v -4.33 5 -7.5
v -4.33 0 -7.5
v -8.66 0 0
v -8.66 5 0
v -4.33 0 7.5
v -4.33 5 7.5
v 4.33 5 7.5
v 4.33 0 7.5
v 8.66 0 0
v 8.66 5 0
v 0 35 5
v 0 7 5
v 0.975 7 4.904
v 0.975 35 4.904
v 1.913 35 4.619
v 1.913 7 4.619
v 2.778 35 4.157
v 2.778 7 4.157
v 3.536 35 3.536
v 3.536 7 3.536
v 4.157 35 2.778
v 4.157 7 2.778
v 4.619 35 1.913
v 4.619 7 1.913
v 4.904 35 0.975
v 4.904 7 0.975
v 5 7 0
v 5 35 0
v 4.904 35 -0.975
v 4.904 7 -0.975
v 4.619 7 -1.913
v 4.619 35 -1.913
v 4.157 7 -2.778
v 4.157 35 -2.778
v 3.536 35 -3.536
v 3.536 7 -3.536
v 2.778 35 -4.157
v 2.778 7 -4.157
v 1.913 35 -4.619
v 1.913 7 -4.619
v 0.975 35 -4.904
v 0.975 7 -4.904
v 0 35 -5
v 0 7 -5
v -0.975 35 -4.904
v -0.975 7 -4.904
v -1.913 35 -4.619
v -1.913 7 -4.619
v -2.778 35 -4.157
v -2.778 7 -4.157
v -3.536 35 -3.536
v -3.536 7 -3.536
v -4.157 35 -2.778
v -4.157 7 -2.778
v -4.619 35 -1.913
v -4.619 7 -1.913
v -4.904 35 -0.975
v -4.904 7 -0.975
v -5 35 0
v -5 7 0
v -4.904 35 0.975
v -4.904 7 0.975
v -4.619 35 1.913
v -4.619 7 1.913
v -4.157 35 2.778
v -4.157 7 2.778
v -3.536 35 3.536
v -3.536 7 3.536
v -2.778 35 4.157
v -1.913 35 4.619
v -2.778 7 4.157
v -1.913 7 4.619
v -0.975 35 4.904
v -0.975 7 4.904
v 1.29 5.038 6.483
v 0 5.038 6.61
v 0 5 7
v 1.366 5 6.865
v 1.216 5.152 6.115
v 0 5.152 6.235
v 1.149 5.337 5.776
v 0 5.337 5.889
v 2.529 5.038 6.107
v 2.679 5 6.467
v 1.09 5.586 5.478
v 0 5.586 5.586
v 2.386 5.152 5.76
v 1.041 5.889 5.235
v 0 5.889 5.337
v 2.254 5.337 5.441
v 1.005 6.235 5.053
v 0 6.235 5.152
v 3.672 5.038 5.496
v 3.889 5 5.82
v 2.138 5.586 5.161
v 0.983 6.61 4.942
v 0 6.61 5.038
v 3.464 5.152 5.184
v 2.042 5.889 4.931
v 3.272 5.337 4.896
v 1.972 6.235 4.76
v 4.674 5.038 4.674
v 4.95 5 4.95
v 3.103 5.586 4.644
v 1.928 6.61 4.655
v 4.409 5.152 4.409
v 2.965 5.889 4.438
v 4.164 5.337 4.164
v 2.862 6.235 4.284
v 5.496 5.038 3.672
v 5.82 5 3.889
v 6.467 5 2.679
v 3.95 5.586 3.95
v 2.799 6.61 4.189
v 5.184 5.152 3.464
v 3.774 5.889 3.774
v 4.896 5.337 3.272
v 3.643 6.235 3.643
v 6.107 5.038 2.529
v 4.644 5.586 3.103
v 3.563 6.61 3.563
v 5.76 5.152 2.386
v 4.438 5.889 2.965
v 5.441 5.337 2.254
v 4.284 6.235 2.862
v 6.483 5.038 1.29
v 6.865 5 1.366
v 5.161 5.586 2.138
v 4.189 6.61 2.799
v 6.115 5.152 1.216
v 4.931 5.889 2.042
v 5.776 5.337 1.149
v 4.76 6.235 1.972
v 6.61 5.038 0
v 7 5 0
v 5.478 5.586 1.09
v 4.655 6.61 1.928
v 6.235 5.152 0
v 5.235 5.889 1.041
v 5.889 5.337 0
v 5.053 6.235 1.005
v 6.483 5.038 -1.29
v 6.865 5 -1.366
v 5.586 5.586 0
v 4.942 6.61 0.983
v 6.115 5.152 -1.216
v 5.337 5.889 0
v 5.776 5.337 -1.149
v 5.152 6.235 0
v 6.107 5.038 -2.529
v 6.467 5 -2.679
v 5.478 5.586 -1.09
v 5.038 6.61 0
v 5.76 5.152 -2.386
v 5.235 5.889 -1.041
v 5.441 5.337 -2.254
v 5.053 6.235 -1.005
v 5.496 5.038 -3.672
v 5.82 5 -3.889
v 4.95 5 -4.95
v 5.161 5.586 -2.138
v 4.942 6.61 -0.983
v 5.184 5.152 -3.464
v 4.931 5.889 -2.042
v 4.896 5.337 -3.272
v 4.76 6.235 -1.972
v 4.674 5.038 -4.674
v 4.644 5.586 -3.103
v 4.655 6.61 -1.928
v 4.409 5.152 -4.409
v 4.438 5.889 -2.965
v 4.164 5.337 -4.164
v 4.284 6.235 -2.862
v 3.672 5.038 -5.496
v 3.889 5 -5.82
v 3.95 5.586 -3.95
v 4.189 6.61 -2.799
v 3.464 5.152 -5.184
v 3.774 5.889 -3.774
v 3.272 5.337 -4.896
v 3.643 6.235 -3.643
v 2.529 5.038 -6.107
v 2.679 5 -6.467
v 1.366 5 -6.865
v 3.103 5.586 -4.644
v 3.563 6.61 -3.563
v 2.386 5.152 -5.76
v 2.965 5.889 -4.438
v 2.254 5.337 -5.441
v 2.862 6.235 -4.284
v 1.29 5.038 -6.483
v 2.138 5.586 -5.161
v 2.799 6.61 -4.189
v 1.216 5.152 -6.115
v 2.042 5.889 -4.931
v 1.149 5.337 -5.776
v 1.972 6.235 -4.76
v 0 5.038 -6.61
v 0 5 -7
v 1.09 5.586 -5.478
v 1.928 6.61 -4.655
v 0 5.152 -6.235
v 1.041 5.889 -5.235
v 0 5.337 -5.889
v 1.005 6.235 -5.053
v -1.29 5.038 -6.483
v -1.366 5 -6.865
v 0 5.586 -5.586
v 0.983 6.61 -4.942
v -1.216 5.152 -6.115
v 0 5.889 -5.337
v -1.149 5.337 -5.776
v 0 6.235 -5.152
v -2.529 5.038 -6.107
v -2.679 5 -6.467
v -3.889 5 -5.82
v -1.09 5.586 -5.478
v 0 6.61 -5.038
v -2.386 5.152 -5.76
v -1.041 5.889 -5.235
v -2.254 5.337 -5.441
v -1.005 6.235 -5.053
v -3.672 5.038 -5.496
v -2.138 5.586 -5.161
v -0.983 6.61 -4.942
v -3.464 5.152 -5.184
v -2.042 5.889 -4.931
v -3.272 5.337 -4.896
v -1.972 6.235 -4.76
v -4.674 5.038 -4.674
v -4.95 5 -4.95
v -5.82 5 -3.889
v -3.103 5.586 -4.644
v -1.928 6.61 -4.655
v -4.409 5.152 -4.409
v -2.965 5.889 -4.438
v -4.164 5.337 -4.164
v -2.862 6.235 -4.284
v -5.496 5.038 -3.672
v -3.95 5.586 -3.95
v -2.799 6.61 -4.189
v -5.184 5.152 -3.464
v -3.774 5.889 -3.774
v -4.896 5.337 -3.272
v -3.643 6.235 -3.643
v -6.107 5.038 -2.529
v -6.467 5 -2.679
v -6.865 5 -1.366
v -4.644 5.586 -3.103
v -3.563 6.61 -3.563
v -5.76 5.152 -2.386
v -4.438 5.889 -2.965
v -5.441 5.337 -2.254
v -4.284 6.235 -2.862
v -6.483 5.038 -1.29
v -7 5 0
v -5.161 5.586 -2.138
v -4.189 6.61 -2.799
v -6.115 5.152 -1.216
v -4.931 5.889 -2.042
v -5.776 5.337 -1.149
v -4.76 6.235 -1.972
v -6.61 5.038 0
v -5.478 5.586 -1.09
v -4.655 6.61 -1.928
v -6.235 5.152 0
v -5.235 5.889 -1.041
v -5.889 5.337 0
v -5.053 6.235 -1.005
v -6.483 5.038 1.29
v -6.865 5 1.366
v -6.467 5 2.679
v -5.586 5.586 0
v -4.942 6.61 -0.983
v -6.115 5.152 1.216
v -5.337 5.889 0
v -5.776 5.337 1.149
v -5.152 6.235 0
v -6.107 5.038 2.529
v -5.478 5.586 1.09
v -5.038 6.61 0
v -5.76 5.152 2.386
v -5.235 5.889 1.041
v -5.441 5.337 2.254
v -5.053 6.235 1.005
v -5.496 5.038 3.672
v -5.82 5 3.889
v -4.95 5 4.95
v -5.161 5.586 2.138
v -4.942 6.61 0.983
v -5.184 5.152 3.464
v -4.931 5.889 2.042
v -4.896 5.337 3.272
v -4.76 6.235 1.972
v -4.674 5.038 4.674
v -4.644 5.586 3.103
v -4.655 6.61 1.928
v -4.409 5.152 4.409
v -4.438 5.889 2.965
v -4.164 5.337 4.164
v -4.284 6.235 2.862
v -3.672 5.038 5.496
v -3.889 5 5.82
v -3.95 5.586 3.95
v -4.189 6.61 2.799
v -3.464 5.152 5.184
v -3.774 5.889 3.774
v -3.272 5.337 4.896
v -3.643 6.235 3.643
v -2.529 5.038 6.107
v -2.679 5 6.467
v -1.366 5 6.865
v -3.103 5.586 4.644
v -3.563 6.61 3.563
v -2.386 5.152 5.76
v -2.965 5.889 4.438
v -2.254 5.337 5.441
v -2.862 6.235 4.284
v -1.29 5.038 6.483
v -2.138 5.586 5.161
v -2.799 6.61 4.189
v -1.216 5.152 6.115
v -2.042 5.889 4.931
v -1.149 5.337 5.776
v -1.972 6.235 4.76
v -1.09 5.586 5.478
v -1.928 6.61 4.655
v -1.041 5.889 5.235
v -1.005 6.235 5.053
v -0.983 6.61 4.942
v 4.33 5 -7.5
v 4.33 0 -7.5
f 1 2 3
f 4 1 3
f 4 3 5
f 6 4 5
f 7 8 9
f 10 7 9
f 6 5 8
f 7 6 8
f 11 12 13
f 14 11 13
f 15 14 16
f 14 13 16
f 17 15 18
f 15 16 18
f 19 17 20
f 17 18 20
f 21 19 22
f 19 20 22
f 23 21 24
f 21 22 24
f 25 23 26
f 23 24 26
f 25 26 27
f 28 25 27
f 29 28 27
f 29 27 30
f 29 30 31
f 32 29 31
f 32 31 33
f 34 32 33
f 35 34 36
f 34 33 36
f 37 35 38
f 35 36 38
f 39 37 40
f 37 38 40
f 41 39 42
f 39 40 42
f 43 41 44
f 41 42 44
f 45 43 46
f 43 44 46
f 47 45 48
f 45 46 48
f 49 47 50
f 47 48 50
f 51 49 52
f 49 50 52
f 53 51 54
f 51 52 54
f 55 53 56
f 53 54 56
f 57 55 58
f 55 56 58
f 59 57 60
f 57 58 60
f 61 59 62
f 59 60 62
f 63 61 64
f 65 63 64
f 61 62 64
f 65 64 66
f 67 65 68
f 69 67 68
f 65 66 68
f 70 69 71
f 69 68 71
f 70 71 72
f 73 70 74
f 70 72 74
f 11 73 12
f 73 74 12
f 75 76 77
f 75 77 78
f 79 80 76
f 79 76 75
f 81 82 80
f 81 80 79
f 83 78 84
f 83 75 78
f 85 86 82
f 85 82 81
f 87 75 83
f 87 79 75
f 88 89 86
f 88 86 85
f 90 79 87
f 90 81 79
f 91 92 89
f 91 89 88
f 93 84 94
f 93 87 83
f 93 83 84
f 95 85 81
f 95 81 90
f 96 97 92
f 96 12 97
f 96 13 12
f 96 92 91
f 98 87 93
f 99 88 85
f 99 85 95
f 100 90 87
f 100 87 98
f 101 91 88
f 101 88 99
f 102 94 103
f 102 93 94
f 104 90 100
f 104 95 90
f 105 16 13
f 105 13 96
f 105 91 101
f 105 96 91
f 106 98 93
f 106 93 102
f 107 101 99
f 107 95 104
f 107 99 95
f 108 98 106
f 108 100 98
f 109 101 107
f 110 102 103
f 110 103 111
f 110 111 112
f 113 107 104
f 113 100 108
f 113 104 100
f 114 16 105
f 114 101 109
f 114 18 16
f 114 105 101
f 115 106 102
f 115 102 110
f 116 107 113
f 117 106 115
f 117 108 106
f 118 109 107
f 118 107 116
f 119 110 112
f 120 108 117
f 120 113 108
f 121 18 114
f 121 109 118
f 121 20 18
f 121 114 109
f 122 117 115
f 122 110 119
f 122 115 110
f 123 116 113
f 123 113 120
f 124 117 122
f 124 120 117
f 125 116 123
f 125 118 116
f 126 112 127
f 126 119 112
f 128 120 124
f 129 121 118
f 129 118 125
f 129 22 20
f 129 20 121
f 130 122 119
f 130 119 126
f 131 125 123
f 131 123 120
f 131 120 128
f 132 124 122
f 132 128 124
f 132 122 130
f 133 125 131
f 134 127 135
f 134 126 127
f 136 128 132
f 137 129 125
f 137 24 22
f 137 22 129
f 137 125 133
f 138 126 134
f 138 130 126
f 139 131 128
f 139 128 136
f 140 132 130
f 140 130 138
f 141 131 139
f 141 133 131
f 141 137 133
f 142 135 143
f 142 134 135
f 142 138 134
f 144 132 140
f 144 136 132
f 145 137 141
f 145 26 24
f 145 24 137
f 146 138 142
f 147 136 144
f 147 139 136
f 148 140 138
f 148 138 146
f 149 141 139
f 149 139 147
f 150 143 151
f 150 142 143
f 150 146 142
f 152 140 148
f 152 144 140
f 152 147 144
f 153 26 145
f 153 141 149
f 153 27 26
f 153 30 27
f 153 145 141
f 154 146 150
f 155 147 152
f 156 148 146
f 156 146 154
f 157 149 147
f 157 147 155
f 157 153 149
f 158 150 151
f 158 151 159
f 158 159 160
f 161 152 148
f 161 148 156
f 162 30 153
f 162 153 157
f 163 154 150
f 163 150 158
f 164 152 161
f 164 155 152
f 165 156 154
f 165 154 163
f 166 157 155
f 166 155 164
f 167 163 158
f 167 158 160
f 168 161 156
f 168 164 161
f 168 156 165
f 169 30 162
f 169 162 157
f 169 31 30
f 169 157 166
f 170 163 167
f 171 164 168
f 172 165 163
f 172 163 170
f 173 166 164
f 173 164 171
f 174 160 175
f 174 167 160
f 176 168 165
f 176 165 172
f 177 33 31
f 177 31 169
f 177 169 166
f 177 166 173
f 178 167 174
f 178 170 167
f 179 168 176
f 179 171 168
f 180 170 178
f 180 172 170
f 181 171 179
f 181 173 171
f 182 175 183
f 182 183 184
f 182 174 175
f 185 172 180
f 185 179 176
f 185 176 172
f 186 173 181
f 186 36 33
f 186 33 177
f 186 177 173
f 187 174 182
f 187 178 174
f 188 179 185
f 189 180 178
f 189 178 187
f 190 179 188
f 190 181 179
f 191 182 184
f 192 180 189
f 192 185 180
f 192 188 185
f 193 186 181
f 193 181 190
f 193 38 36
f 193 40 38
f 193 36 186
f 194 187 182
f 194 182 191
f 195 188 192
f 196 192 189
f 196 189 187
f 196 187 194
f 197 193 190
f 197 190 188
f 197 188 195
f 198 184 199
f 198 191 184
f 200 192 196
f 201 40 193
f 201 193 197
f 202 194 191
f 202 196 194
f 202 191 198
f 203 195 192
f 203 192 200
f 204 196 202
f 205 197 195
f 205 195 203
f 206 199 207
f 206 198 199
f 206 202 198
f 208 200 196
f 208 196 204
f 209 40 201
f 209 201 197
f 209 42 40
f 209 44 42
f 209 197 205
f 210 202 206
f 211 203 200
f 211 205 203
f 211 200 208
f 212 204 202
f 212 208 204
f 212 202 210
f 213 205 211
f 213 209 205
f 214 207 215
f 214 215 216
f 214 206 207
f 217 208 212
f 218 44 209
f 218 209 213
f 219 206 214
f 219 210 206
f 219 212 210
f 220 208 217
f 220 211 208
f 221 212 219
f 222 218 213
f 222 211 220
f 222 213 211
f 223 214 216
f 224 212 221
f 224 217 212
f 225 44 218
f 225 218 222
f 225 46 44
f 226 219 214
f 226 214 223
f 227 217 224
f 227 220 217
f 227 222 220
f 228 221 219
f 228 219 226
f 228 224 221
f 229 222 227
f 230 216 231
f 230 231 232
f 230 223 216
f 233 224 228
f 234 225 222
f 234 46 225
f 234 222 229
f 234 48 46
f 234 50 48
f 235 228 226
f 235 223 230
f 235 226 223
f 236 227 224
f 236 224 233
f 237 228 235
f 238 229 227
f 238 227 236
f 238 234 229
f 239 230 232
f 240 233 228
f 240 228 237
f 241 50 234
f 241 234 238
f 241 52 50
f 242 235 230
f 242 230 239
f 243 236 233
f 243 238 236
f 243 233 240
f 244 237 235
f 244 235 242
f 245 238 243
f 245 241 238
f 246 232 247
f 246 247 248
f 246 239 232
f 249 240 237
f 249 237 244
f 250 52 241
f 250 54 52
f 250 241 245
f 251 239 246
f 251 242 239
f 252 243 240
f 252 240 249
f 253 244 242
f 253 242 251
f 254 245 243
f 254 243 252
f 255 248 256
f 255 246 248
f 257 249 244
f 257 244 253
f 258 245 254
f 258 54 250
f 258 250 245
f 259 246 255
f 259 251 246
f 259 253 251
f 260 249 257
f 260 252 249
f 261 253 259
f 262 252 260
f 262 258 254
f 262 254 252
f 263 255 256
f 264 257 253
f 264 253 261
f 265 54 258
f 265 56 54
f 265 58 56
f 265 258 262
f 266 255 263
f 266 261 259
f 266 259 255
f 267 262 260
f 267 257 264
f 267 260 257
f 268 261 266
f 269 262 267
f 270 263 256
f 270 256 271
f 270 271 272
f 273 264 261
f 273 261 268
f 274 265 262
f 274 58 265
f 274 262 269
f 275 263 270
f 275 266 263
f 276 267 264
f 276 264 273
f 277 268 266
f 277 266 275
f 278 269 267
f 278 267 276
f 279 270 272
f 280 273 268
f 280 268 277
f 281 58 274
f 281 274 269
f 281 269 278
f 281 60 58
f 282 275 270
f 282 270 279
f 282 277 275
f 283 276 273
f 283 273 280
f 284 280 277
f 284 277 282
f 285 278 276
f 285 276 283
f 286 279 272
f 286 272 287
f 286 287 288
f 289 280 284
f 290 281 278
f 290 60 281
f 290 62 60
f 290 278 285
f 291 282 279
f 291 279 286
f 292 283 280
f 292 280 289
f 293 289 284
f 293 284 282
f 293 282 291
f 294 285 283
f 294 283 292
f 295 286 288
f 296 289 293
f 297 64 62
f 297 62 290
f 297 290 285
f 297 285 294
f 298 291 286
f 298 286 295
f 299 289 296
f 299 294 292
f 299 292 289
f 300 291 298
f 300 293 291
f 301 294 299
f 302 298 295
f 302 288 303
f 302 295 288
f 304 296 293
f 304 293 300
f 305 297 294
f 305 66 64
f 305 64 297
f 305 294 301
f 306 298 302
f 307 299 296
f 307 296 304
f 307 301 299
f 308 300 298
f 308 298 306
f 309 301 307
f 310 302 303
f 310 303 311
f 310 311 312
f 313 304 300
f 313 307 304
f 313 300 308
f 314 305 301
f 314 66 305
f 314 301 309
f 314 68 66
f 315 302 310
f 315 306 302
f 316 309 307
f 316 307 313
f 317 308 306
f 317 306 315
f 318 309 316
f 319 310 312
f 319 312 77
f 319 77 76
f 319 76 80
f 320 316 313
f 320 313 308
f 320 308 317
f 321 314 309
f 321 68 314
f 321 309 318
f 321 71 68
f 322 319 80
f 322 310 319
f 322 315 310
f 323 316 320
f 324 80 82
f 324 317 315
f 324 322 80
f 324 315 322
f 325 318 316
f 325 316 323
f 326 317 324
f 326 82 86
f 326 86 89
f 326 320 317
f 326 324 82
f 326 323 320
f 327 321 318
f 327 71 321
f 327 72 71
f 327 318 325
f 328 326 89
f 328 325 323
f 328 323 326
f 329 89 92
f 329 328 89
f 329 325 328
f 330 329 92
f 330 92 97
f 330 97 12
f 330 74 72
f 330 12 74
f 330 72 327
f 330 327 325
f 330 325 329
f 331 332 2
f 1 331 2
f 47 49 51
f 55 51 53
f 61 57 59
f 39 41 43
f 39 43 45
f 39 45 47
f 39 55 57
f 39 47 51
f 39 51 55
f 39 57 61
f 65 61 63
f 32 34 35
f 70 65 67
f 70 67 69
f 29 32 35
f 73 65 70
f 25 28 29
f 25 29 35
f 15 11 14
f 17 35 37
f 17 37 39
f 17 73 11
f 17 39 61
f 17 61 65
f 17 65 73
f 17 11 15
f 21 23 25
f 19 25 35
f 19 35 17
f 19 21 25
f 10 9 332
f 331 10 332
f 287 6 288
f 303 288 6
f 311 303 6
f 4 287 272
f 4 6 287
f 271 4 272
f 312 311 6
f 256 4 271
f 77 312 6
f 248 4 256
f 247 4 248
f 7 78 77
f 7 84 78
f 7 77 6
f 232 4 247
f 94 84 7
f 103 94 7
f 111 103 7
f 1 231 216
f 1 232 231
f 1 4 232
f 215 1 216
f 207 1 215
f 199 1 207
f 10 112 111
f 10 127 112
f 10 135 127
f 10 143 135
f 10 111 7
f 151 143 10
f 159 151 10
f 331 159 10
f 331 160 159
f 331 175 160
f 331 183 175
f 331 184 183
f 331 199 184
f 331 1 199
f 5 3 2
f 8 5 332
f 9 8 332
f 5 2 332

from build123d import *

# Parameters (mm, degrees)
BOSS_EXTRUDE1_DEPTH = 5
SKETCH2_R           = 5
BOSS_EXTRUDE2_DEPTH = 30
FILLET1_R           = 2


with BuildPart() as part:
    # Sketch1 → Boss-Extrude1 (new body)
    with BuildSketch(Plane(origin=(0, 0, 0), x_dir=(1, 0, 0), z_dir=(0, 1, 0))):
        Polygon((8.660254038, 0), (4.330127019, 7.5), (-4.330127019, 7.5), (-8.660254038, 0), (-4.330127019, -7.5), (4.330127019, -7.5), align=None)
    extrude(amount=BOSS_EXTRUDE1_DEPTH)

    # Sketch2 → Boss-Extrude2 (add)
    with BuildSketch(Plane(origin=(0, 5, 0), x_dir=(1, 0, 0), z_dir=(0, 1, 0))):
        with Locations(Location((0, 0, 0), (0, 0, 270))):
            Circle(SKETCH2_R)
    extrude(amount=BOSS_EXTRUDE2_DEPTH)

    # Fillet1
    fillet1_edges = [part.edges().sort_by_distance(p)[0] for p in [
        (0, 5, -5),
    ]]
    fillet(fillet1_edges, radius=FILLET1_R)


solid = part.part
